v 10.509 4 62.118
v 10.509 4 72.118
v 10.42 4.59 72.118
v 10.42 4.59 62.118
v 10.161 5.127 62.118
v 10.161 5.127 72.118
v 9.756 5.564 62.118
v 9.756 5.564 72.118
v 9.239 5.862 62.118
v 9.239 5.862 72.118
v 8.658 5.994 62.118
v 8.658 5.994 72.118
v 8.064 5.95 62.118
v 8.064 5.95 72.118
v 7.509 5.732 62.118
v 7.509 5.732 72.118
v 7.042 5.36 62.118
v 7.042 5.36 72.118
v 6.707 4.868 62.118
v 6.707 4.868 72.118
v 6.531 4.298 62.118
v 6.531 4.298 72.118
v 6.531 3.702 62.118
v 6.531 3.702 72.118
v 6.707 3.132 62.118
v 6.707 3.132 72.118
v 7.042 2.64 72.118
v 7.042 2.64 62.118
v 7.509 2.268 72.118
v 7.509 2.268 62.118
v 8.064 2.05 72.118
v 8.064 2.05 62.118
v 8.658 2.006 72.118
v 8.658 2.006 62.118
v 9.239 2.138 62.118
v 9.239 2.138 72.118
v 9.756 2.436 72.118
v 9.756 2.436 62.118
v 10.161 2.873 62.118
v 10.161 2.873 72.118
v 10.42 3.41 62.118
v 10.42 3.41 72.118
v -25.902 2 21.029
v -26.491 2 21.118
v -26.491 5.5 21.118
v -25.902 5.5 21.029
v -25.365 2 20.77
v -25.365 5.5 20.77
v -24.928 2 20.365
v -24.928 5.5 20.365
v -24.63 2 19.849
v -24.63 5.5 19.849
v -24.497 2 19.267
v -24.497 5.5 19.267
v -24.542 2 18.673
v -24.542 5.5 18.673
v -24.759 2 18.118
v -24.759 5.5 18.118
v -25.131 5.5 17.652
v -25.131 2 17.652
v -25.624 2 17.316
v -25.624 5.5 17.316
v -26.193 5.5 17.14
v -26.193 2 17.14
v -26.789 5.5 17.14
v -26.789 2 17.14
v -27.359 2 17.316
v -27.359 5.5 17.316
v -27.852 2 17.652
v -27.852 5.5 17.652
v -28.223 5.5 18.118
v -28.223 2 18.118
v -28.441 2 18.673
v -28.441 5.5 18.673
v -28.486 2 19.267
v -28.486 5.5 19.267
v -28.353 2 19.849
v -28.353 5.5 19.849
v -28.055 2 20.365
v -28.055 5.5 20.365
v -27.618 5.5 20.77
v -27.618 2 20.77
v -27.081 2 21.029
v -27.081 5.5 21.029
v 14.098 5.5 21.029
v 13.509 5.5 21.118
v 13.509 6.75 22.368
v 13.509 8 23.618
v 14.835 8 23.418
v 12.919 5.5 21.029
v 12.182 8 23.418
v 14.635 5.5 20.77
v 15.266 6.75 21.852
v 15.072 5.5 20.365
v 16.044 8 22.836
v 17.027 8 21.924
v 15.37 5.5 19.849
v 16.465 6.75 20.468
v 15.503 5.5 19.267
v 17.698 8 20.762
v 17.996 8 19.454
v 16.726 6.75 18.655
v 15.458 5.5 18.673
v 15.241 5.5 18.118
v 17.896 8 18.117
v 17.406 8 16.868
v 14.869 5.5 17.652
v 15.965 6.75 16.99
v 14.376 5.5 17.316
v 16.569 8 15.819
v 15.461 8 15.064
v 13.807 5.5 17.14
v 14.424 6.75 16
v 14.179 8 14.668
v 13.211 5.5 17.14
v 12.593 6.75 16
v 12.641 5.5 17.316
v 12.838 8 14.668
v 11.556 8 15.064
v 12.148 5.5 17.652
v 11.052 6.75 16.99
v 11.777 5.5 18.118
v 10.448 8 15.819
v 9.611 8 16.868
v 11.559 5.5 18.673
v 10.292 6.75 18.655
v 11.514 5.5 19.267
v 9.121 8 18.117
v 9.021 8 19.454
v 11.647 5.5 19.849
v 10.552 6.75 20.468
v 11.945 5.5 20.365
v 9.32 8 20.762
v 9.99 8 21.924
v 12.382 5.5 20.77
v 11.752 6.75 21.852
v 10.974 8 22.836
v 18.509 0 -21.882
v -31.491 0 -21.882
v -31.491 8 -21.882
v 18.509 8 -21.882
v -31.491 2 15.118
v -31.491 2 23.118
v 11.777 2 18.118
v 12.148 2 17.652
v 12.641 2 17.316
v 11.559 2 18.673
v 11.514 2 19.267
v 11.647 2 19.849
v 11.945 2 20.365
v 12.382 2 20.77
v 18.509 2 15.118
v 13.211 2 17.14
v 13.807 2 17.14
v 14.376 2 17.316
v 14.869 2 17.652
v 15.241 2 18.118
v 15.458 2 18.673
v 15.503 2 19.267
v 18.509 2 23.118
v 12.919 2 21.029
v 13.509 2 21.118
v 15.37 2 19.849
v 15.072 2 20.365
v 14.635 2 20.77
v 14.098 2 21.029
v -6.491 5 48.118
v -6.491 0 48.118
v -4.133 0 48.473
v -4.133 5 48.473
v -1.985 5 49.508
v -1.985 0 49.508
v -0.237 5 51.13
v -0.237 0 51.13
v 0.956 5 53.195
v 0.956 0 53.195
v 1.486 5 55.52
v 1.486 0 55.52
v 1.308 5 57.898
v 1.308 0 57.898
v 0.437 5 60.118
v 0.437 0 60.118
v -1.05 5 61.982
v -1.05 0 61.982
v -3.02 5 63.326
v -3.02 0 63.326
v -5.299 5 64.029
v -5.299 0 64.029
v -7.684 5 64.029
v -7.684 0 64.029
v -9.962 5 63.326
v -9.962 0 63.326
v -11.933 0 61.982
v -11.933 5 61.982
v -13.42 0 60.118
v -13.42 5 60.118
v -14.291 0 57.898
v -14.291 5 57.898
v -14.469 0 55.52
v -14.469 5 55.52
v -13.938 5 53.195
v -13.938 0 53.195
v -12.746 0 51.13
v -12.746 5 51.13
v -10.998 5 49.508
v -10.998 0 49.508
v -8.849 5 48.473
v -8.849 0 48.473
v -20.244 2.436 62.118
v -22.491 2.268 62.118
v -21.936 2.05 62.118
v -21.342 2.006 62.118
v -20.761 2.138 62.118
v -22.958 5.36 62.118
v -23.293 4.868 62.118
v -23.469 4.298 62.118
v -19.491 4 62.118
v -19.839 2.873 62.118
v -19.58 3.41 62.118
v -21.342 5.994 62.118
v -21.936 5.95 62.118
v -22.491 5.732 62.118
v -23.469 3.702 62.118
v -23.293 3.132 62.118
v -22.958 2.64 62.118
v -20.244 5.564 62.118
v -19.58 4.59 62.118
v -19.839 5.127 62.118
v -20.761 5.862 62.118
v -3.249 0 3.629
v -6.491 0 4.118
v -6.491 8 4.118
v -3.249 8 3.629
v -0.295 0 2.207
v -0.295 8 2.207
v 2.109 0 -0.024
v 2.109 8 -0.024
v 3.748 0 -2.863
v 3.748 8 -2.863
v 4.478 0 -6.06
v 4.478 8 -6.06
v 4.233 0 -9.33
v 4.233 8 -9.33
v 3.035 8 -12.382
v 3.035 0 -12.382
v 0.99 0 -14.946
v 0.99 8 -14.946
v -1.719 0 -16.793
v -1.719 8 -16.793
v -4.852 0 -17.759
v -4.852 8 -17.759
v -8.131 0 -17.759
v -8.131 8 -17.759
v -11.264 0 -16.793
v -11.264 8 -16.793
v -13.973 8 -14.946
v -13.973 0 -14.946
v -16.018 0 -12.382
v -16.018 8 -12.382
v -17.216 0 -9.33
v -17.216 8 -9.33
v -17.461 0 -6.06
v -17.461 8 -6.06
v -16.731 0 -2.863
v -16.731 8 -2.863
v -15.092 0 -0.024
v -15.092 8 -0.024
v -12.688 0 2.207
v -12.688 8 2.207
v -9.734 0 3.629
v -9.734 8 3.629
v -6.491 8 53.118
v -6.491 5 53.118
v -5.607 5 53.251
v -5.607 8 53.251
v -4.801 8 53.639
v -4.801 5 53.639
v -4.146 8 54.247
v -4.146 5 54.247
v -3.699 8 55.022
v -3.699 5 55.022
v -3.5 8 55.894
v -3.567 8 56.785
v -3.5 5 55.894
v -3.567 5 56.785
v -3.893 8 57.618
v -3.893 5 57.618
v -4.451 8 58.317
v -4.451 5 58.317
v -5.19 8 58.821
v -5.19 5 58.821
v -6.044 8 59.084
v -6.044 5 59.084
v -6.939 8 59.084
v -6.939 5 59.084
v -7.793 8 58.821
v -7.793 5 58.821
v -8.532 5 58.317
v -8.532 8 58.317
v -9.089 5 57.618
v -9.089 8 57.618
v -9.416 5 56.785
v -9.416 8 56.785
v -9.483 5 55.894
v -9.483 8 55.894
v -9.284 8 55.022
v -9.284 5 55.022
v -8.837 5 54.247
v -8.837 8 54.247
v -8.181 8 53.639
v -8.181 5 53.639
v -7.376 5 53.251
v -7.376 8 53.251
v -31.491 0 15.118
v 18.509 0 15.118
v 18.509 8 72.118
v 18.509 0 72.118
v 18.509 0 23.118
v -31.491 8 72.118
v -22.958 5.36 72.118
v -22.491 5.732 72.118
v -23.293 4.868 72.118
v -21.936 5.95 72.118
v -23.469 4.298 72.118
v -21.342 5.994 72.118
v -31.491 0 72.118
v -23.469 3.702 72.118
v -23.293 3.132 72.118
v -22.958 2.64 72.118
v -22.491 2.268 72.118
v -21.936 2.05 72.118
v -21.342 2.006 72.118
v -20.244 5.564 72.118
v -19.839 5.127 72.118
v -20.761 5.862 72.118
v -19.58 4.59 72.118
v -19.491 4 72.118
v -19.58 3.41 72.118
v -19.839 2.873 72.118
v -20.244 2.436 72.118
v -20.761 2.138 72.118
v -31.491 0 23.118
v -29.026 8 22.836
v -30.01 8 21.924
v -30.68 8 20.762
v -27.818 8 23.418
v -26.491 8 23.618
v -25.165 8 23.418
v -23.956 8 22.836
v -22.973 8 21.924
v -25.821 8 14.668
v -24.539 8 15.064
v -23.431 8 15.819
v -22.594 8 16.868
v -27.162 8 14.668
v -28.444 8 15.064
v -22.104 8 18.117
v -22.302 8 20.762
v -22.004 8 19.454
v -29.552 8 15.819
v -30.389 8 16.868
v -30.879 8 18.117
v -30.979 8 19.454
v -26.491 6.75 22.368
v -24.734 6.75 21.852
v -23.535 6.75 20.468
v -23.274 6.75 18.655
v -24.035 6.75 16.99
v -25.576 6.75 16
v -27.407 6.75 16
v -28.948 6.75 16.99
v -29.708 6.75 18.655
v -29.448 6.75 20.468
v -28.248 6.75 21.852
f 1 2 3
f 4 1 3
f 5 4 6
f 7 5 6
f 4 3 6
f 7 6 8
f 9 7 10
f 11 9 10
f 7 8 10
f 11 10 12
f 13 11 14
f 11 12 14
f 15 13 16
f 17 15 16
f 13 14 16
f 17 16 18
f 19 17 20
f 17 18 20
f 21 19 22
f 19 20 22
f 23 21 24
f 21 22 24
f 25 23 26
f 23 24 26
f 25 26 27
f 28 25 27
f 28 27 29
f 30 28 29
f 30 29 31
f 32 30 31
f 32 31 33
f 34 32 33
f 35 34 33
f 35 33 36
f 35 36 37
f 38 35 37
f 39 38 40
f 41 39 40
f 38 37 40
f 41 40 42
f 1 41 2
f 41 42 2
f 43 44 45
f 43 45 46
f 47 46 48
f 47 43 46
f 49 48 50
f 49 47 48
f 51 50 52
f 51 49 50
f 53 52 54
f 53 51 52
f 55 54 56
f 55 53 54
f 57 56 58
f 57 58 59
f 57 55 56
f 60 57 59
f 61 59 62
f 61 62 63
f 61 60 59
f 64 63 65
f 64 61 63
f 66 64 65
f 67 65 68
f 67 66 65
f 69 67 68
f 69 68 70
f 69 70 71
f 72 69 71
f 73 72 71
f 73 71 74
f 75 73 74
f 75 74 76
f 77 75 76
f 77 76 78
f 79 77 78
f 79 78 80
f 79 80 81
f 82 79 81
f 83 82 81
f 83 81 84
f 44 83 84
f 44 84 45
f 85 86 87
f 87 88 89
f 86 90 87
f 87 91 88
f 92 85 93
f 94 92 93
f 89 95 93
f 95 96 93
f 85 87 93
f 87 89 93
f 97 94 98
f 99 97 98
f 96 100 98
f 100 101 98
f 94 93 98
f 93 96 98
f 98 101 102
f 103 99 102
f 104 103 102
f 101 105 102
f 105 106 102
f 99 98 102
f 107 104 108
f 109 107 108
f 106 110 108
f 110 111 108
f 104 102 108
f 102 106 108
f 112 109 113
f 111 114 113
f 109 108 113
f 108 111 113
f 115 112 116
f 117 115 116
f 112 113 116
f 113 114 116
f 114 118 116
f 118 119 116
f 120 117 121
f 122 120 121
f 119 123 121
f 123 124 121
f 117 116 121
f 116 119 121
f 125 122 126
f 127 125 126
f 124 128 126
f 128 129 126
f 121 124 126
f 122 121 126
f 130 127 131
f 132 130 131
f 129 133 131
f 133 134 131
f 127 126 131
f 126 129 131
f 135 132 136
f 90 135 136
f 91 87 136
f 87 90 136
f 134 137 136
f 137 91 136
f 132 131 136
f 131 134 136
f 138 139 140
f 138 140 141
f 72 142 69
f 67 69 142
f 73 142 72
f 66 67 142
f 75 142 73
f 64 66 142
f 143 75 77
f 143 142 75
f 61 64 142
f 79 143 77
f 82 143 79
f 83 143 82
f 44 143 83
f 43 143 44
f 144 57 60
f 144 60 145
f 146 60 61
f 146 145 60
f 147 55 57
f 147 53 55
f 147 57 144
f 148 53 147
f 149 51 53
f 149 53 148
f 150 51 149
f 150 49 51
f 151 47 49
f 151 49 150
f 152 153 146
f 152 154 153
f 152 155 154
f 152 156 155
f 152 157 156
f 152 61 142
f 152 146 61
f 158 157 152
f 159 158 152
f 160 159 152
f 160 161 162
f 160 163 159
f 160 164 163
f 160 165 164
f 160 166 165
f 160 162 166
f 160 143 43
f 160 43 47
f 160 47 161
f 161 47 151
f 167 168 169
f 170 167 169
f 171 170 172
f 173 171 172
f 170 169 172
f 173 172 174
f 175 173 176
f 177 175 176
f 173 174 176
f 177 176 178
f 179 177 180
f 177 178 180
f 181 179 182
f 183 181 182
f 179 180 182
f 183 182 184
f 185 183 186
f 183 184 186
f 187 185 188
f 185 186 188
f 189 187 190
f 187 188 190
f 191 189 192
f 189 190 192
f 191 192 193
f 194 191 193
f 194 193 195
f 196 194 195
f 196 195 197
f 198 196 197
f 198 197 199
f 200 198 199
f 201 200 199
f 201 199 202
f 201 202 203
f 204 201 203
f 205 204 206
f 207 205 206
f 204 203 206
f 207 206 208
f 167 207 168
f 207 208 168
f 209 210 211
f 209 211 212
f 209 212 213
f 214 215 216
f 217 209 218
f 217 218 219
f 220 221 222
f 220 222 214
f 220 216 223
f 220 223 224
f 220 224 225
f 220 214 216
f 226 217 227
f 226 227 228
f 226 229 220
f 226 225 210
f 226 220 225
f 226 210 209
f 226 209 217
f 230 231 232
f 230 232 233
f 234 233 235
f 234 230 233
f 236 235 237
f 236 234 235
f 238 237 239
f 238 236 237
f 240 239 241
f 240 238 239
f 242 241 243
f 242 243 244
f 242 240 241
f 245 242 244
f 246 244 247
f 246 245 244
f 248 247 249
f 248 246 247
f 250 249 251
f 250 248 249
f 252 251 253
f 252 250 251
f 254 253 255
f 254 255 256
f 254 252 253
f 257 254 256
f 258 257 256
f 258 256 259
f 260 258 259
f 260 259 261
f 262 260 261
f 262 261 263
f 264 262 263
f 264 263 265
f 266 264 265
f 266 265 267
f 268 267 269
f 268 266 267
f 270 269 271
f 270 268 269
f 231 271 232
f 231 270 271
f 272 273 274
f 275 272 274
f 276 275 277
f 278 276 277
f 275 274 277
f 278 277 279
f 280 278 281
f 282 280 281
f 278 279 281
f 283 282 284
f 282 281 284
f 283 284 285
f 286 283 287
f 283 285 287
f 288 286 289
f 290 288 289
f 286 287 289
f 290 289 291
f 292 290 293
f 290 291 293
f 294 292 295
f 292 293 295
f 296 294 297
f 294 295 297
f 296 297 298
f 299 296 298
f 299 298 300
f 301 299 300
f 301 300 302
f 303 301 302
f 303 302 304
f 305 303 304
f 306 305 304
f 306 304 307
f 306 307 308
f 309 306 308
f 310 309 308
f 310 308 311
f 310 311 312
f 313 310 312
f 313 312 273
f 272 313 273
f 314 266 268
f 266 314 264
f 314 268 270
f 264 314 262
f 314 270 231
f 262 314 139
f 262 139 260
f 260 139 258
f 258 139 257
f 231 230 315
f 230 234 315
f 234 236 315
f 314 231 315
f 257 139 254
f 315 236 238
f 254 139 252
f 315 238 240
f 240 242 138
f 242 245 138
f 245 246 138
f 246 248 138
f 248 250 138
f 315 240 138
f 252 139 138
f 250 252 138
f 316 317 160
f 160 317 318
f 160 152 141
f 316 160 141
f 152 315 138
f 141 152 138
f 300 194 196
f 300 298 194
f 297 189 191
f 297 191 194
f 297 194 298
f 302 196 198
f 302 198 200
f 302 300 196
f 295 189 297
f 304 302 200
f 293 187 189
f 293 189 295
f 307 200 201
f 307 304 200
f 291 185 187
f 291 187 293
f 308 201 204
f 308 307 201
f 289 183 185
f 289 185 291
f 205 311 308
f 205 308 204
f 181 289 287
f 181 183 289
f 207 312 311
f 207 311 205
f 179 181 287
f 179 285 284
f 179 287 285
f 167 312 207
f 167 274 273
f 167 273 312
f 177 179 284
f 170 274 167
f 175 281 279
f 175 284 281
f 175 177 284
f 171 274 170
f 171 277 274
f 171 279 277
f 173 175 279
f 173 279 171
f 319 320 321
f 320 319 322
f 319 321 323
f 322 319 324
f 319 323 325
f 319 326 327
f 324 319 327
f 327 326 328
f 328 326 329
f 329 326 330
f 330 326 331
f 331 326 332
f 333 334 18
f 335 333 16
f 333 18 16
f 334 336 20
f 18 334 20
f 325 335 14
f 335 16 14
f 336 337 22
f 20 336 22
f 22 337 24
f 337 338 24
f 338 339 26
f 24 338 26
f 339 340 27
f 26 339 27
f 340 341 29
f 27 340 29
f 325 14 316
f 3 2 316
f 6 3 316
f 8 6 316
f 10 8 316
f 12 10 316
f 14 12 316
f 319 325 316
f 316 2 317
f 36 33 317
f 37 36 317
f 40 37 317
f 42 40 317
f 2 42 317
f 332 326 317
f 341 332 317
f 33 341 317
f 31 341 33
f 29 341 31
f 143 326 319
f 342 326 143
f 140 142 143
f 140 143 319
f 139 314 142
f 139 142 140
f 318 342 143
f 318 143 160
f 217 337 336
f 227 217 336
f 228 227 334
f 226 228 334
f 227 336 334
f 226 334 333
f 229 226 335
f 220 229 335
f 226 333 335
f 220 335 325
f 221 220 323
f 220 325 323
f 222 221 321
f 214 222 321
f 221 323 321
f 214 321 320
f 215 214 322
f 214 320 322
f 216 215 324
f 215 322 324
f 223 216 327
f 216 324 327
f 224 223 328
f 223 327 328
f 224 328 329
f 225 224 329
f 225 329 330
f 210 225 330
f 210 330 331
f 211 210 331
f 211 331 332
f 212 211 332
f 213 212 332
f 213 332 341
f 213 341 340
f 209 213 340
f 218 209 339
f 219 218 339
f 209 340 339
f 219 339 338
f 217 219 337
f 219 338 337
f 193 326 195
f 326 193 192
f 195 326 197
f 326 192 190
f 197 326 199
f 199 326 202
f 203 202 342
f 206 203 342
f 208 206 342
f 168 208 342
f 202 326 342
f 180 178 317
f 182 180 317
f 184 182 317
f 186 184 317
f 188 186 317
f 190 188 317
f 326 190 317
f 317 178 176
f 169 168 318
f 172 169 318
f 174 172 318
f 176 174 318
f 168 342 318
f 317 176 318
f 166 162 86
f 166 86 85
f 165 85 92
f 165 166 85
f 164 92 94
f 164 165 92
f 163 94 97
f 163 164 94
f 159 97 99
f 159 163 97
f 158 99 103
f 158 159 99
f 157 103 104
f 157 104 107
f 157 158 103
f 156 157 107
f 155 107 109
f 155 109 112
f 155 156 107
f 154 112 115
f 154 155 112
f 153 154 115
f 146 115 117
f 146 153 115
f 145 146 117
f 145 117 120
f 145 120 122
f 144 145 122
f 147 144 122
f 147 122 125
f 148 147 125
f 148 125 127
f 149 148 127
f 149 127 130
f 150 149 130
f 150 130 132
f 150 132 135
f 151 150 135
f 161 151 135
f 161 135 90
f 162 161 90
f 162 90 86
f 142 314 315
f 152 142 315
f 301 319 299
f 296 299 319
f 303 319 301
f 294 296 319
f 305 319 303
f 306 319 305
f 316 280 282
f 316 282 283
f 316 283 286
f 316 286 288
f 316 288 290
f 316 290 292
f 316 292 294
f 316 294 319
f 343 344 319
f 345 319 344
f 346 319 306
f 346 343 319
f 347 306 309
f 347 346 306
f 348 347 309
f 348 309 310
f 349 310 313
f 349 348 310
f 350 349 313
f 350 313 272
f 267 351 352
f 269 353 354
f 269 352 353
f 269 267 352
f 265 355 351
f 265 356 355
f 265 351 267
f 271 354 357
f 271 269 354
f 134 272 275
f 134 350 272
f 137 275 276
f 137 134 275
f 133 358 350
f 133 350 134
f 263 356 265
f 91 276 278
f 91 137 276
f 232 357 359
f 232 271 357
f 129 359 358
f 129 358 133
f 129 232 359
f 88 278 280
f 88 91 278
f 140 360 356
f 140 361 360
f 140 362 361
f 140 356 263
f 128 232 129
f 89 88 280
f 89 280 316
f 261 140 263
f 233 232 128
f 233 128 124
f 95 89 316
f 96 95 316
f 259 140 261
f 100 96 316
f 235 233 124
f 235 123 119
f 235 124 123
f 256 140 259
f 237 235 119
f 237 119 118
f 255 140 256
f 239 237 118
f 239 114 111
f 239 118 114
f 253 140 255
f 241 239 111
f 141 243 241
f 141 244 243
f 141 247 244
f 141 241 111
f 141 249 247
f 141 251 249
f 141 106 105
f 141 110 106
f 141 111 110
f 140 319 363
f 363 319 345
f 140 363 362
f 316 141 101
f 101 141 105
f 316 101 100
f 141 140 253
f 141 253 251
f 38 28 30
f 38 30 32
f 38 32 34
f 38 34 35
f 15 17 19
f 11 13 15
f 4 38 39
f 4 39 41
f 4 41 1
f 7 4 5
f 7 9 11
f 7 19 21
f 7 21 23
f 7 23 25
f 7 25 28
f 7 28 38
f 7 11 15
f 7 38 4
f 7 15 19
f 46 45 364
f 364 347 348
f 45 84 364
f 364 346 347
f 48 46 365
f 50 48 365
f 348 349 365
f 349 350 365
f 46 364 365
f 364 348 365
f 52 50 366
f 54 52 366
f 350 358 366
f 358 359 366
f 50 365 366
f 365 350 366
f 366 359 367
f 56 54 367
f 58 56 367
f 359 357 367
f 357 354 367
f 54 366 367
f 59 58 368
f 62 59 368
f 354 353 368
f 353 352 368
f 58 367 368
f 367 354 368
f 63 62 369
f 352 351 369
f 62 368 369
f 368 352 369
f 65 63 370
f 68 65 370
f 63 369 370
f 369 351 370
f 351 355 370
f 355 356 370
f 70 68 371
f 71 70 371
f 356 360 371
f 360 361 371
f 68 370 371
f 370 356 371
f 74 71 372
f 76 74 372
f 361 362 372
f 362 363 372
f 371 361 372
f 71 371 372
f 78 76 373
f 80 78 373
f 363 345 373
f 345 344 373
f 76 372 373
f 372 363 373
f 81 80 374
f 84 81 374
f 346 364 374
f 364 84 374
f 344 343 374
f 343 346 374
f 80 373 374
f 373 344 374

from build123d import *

# Parameters (mm, degrees)
ESQUISSE1_W             = 50
ESQUISSE1_H             = 94
ESQUISSE1_R             = 11
ESQUISSE1_R_2           = 2
BOSS_EXTRU_1_DEPTH      = 8
CHANFREIN1_SIZE         = 2.5
ESQUISSE2_R             = 2
ENL_V_MAT_EXTRU_1_DEPTH = 10
ESQUISSE3_R             = 8
ENL_V_MAT_EXTRU_2_DEPTH = 5
ESQUISSE4_R             = 3
ENL_V_MAT_EXTRU_3_DEPTH = 79.852413099
ESQUISSE5_W             = 50
ESQUISSE5_H             = 8
ENL_V_MAT_EXTRU_4_DEPTH = 2


with BuildPart() as part:
    # Esquisse1 → Boss.-Extru.1 (new body)
    with BuildSketch(Plane(origin=(0, 0, 0), x_dir=(1, 0, 0), z_dir=(0, 1, 0))):
        with Locations((-6.491408935, -25.117918819)):
            Rectangle(ESQUISSE1_W, ESQUISSE1_H)
        with Locations(Location((-6.491408935, 6.882081181, 0), (0, 0, 270))):
            Circle(ESQUISSE1_R, mode=Mode.SUBTRACT)
        with Locations(Location((-26.491408935, -19.117918819, 0), (0, 0, 270))):
            Circle(ESQUISSE1_R_2, mode=Mode.SUBTRACT)
        with Locations(Location((13.508591065, -19.117918819, 0), (0, 0, 270))):
            Circle(ESQUISSE1_R_2, mode=Mode.SUBTRACT)
    extrude(amount=BOSS_EXTRU_1_DEPTH)

    # Chanfrein1
    chanfrein1_edges = [part.edges().sort_by_distance(p)[0] for p in [
        (-26.491408935, 8, 17.117918819),
        (13.508591065, 8, 17.117918819),
    ]]
    chamfer(chanfrein1_edges, length=CHANFREIN1_SIZE)

    # Esquisse2 → Enlèv. mat.-Extru.1 (cut)
    with BuildSketch(Plane.XY.offset(72.117918819)):
        with Locations((-21.491408935, 4)):
            Circle(ESQUISSE2_R)
        with Locations((8.508591065, 4)):
            Circle(ESQUISSE2_R)
    extrude(amount=-ENL_V_MAT_EXTRU_1_DEPTH, mode=Mode.SUBTRACT)

    # Esquisse3 → Enlèv. mat.-Extru.2 (cut)
    with BuildSketch(Plane.XZ):
        with Locations(Location((-6.491408935, 56.117918819, 0), (0, 0, 270))):
            Circle(ESQUISSE3_R)
    extrude(amount=-ENL_V_MAT_EXTRU_2_DEPTH, mode=Mode.SUBTRACT)

    # Esquisse4 → Enlèv. mat.-Extru.3 (cut, through all)
    with BuildSketch(Plane.XZ.offset(-5)):
        with Locations(Location((-6.491408935, 56.117918819, 0), (0, 0, 270))):
            Circle(ESQUISSE4_R)
    extrude(amount=-ENL_V_MAT_EXTRU_3_DEPTH, mode=Mode.SUBTRACT)

    # Esquisse5 → Enlèv. mat.-Extru.4 (cut)
    with BuildSketch(Plane.XZ):
        with Locations((-6.491408935, 19.117918819)):
            Rectangle(ESQUISSE5_W, ESQUISSE5_H)
    extrude(amount=-ENL_V_MAT_EXTRU_4_DEPTH, mode=Mode.SUBTRACT)


solid = part.part
